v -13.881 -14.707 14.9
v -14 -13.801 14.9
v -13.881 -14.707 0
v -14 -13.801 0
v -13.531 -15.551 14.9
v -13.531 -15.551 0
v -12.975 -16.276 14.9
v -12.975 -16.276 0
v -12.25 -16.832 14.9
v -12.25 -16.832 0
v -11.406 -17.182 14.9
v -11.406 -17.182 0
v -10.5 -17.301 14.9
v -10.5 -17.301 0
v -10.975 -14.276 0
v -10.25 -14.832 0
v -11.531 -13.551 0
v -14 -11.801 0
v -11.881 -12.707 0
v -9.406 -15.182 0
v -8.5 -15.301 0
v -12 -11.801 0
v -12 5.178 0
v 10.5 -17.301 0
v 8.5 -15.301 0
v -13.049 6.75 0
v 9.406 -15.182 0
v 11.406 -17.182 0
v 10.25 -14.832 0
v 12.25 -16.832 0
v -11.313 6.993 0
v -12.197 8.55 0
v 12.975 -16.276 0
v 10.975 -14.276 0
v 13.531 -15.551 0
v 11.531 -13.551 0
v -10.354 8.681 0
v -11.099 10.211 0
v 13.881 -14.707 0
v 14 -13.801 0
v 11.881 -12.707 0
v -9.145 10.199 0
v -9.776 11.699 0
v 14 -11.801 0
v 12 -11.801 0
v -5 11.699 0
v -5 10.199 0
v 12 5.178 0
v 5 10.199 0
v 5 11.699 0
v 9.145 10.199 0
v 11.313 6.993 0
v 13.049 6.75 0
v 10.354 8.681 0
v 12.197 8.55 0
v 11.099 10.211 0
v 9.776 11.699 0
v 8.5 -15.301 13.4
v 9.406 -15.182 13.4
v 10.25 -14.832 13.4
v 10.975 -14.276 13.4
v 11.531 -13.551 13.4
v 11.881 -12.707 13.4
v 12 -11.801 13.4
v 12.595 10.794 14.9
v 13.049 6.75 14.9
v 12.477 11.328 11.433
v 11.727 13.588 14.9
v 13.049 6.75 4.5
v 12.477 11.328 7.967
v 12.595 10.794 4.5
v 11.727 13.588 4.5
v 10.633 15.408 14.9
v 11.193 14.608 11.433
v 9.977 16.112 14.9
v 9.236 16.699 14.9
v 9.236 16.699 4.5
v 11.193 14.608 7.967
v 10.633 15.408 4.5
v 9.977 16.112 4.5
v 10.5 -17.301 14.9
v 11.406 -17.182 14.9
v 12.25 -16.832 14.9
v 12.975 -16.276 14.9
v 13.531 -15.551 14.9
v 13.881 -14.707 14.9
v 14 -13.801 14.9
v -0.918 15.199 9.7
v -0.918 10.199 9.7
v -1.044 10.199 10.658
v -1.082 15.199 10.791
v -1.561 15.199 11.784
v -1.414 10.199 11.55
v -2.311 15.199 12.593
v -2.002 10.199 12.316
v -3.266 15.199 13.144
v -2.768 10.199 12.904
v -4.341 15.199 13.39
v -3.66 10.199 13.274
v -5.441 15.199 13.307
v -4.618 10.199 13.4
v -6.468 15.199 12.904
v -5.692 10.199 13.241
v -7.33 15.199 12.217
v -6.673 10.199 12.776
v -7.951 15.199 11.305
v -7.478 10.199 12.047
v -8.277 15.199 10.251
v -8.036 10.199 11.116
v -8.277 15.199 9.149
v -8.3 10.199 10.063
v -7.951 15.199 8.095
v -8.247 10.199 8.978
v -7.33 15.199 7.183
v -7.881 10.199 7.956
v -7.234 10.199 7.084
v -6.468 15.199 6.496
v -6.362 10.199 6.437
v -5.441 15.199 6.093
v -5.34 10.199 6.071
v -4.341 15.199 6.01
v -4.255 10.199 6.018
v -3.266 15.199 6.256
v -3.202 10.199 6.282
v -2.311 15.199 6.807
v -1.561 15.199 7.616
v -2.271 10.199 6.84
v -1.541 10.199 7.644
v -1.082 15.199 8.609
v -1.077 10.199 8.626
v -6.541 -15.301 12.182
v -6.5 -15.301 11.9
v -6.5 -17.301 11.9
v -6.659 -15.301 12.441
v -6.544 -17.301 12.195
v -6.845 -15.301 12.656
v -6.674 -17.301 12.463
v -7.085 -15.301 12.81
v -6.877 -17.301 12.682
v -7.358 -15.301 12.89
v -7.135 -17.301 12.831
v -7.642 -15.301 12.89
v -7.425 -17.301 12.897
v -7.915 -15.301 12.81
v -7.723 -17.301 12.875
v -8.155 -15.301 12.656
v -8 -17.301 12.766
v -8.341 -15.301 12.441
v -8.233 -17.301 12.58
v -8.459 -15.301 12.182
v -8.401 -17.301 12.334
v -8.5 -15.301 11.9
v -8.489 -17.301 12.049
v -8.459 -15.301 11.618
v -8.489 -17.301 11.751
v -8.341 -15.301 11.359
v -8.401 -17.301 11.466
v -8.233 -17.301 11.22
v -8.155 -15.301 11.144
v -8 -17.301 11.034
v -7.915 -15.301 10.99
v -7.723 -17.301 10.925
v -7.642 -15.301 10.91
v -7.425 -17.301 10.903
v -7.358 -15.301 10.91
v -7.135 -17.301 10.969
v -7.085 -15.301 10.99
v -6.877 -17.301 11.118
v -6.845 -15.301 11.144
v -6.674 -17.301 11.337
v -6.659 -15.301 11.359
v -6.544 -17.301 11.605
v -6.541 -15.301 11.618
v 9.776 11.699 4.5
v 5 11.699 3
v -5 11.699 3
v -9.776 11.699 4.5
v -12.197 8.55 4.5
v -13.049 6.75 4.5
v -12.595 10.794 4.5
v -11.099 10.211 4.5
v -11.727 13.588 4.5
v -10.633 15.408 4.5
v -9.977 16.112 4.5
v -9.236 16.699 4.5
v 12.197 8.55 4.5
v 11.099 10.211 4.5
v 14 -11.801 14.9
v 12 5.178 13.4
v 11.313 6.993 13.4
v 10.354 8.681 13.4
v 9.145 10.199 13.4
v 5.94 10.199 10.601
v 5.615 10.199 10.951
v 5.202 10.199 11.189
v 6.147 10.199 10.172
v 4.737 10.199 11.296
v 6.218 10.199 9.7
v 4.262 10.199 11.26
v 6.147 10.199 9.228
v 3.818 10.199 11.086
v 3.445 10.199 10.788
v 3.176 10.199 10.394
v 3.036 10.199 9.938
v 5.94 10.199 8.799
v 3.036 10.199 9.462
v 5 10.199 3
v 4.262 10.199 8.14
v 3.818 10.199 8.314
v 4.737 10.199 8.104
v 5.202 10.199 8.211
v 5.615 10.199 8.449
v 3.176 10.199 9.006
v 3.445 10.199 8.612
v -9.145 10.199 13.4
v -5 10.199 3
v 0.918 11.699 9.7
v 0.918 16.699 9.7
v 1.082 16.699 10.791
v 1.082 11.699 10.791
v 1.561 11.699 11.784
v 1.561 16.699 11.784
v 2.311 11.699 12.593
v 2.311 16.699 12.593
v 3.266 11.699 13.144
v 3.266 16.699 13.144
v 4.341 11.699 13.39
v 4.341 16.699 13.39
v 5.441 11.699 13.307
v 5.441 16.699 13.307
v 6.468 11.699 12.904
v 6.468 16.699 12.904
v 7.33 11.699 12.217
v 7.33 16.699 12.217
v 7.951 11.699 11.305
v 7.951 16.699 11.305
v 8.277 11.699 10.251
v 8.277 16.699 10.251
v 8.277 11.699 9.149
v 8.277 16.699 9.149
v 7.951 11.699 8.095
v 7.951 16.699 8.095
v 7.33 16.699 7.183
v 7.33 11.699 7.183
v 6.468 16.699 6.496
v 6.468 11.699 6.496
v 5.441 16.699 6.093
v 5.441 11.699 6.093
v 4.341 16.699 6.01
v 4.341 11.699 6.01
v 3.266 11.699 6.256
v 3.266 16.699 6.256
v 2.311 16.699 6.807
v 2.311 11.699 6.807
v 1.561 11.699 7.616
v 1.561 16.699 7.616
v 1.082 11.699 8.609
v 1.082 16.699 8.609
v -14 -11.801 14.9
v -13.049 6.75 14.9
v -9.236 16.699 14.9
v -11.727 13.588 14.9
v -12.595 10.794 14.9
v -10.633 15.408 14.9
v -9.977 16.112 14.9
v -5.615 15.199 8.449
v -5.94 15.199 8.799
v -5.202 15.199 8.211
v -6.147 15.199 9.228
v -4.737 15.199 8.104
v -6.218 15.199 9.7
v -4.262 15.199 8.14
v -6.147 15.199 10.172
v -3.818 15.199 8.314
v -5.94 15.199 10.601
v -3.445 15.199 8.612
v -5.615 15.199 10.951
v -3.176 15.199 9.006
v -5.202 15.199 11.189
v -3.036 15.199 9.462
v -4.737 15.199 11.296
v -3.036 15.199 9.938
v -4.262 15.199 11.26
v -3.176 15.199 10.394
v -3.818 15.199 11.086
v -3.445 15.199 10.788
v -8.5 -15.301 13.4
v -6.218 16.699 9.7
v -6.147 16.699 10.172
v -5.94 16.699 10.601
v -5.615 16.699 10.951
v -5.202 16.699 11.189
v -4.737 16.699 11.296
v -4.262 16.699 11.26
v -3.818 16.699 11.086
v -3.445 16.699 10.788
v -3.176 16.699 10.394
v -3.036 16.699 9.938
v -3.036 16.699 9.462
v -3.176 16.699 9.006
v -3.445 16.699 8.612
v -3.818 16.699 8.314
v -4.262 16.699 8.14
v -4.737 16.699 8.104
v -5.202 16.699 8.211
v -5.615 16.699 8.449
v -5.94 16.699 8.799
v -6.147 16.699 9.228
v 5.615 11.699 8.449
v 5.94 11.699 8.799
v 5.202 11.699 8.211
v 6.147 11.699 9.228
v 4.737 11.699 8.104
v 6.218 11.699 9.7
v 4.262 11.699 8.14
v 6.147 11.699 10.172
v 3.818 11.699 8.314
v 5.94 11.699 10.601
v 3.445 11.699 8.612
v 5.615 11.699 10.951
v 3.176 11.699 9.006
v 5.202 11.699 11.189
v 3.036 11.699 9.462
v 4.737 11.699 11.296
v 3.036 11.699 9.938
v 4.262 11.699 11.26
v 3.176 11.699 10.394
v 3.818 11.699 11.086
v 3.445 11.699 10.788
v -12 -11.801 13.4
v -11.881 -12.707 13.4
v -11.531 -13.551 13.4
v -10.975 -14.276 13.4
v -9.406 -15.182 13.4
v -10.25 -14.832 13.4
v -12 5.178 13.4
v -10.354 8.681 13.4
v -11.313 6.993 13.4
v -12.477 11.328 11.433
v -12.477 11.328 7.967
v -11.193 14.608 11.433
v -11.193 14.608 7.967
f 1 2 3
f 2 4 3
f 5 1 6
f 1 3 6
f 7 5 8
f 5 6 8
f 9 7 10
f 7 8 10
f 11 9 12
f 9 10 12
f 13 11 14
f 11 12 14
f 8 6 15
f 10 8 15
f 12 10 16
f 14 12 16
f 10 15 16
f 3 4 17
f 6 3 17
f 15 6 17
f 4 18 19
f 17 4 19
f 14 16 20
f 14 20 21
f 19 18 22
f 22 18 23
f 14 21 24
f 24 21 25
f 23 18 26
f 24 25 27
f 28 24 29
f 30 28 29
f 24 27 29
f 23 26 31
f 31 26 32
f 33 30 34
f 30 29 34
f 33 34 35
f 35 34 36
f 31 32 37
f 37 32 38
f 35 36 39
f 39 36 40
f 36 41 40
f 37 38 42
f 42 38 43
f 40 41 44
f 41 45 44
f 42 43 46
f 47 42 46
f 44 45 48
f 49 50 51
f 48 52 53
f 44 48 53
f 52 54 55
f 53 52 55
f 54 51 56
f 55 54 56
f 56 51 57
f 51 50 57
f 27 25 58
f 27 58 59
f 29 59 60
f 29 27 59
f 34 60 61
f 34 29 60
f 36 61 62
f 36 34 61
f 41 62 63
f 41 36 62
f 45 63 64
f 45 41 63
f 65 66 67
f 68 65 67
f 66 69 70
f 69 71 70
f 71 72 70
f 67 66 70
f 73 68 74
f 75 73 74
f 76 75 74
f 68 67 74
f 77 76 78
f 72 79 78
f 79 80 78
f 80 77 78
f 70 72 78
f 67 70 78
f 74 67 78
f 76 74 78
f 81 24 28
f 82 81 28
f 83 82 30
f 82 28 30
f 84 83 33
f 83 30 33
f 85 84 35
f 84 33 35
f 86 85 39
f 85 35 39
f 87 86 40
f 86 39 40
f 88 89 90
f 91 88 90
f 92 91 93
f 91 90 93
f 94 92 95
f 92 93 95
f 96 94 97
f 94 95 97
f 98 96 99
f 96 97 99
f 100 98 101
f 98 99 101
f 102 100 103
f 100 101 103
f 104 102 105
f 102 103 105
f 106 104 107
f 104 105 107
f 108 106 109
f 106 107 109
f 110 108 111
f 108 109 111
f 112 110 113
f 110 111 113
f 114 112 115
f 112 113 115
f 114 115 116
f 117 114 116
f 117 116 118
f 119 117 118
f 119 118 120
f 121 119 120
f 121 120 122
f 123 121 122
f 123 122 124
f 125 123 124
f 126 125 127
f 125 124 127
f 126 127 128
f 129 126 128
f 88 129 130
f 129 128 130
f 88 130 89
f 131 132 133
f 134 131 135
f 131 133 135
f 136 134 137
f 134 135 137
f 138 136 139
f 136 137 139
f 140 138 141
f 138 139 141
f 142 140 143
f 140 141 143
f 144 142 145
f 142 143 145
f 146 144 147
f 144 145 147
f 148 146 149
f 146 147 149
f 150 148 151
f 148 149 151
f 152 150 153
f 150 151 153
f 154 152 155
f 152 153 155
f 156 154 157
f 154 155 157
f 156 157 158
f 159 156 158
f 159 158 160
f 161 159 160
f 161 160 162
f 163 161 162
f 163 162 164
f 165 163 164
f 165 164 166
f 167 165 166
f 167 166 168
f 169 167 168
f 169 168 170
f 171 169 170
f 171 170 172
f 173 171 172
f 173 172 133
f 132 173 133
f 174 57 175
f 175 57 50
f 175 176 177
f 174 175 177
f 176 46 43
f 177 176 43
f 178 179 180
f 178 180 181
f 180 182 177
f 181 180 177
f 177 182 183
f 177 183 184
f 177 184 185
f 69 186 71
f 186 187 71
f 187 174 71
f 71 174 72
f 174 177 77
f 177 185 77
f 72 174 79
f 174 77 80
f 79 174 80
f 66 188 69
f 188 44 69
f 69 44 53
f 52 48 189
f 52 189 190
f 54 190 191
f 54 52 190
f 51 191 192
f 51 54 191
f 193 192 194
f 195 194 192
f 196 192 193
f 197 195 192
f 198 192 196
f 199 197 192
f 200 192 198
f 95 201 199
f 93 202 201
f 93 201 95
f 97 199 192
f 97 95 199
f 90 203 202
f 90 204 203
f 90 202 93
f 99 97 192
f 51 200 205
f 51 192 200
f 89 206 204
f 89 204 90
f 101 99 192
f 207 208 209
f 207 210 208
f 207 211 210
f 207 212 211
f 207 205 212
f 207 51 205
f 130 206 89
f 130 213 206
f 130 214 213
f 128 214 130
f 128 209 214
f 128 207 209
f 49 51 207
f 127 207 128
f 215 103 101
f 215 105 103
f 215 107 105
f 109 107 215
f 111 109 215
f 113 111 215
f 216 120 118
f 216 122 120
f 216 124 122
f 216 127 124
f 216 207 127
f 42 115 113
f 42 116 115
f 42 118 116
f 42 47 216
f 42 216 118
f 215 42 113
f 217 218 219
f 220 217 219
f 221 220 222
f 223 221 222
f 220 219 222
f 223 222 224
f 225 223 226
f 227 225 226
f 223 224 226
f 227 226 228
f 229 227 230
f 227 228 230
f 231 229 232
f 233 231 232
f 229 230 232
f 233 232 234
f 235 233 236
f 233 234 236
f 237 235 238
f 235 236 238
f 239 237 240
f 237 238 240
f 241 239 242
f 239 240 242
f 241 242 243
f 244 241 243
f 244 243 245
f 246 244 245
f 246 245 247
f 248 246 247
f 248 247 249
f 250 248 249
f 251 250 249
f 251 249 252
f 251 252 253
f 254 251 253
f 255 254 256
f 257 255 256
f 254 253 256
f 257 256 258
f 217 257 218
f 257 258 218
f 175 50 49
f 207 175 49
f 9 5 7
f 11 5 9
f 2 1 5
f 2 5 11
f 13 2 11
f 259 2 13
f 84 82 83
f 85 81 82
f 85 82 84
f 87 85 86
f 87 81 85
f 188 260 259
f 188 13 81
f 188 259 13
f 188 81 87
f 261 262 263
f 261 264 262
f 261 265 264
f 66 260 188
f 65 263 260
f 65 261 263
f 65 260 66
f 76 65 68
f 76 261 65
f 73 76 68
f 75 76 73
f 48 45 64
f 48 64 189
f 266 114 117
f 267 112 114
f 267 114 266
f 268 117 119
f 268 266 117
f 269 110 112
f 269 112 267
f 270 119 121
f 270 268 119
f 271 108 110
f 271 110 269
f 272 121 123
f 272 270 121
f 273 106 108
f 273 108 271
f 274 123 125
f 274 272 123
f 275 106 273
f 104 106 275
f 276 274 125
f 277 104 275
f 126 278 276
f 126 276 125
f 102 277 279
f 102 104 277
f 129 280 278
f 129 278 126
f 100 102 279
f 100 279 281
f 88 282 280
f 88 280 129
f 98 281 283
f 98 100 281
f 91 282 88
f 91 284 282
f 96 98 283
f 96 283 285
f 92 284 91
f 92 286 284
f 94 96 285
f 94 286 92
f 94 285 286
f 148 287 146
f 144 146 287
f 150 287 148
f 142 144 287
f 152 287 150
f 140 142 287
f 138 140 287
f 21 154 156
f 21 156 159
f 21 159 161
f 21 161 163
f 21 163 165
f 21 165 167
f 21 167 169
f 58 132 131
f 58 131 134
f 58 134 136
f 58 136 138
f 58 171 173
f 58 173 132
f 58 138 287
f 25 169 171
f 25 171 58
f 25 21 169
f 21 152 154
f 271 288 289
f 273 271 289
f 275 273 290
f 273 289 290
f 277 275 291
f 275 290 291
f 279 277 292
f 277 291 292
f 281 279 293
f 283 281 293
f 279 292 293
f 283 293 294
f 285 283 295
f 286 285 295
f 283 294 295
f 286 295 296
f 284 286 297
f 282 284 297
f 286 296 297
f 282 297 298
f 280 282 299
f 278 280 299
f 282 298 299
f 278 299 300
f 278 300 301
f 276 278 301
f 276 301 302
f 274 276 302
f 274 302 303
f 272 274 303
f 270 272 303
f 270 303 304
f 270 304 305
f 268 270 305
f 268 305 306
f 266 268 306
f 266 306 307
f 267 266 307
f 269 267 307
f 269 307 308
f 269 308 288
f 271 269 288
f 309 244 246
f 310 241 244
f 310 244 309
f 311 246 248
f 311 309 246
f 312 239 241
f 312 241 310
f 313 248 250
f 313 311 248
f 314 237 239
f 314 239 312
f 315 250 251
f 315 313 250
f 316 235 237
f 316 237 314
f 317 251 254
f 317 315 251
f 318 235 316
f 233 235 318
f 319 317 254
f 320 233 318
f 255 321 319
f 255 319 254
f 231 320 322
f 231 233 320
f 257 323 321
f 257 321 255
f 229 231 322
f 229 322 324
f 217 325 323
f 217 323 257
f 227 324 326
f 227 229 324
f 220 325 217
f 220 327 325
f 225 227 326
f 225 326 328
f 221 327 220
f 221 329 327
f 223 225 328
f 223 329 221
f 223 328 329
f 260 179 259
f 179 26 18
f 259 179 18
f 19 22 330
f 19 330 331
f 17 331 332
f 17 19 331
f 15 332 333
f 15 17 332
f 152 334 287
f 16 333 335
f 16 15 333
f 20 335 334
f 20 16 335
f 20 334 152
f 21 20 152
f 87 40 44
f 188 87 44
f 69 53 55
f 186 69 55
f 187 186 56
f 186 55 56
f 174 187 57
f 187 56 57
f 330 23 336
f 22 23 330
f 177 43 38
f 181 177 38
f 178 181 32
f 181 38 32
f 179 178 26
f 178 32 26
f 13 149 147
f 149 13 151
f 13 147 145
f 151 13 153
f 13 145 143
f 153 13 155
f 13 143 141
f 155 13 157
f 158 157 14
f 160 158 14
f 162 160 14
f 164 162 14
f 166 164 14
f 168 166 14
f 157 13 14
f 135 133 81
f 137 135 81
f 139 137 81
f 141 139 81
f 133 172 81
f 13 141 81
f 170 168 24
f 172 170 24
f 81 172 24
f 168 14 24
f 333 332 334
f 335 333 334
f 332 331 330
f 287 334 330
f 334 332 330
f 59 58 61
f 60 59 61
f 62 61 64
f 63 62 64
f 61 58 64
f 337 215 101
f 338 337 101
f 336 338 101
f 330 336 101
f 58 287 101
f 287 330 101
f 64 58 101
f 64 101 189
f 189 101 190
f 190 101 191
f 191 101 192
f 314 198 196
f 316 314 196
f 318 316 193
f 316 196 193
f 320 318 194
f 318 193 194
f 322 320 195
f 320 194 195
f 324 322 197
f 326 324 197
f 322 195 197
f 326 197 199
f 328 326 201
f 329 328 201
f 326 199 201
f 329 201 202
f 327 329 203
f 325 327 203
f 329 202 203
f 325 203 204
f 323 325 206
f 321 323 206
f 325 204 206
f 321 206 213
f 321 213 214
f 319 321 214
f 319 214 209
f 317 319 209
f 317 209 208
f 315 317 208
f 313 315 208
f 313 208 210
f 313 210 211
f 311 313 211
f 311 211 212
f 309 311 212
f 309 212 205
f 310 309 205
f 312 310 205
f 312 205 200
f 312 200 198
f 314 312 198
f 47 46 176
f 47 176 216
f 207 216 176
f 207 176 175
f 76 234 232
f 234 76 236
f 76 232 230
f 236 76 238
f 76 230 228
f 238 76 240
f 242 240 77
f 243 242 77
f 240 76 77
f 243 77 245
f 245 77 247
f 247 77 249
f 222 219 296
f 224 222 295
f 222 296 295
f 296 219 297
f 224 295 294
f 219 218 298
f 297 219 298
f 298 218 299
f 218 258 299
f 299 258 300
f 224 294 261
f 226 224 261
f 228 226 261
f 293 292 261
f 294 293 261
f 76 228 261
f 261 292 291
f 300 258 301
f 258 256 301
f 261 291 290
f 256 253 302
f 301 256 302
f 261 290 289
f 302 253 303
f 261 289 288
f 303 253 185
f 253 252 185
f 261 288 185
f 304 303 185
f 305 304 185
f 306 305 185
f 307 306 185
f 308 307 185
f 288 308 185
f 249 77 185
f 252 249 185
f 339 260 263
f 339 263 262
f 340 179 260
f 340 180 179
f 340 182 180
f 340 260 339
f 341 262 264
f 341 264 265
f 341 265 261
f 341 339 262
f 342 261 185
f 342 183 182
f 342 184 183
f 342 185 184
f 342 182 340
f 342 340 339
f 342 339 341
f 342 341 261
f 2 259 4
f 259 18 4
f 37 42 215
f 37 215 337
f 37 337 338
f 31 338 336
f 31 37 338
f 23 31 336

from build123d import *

# Parameters (mm, degrees)
F1_DEPTH  = 4.5
F3_DEPTH  = 10.4
F5_DEPTH  = 13.4
F6_R      = 3.7
F6_R_2    = 1.6
F7_DEPTH  = 5
F8_R      = 1.6
F8_R_2    = 3.7
F9_DEPTH  = 5
F10_R     = 1
F11_DEPTH = 2
F12_W     = 10
F12_H     = 1.5
F13_DEPTH = 3


with BuildPart() as f1:
    # F0 (on Top) → F1 (new body)
    with BuildSketch(Plane.XY):
        with BuildLine():
            ThreePointArc((-14, -13.8007847667), (-12.9748737342, -16.2756585008), (-10.5, -17.3007847667))
            Line((-10.5, -17.3007847667), (-6.75, -17.3007847667))
            Line((-6.75, -17.3007847667), (6.75, -17.3007847667))
            Line((6.75, -17.3007847667), (10.5, -17.3007847667))
            ThreePointArc((10.5, -17.3007847667), (12.9748737342, -16.2756585008), (14, -13.8007847667))
            Line((14, -13.8007847667), (14, -11.8007847667))
            Line((14, -11.8007847667), (13.0486556537, 6.7504299853))
            ThreePointArc((13.0486556537, 6.7504299853), (11.6774697173, 9.4001806183), (9.7759521317, 11.6992152333))
            Line((9.7759521317, 11.6992152333), (-9.7759521317, 11.6992152333))
            ThreePointArc((-9.7759521317, 11.6992152333), (-11.6774697173, 9.4001806183), (-13.0486556537, 6.7504299853))
            Line((-13.0486556537, 6.7504299853), (-14, -11.8007847667))
            Line((-14, -11.8007847667), (-14, -13.8007847667))
        make_face()
    extrude(amount=F1_DEPTH)

    # F2 (on face) → F3 (join)
    with BuildSketch(Plane.XY.offset(4.5)):
        with BuildLine():
            Line((14, -13.8007847667), (14, -11.8007847667))
            Line((14, -11.8007847667), (13.0486556537, 6.7504299853))
            add(Edge.make_bspline(
                [(13.0486556537, 6.7504299853), (12.8450421616, 12.0132155716), (11.5178218111, 15.1653625071), (9.2356767608, 16.6992152333)],
                knots=[0, 0, 0, 0, 10.6544420759, 10.6544420759, 10.6544420759, 10.6544420759], degree=3))
            Line((9.2356767608, 16.6992152333), (-9.2356767608, 16.6992152333))
            add(Edge.make_bspline(
                [(-13.0486556537, 6.7504299853), (-12.8450421616, 12.0132155716), (-11.5178218111, 15.1653625071), (-9.2356767608, 16.6992152333)],
                knots=[0, 0, 0, 0, 10.6544420759, 10.6544420759, 10.6544420759, 10.6544420759], degree=3))
            Line((-13.0486556537, 6.7504299853), (-14, -11.8007847667))
            Line((-14, -11.8007847667), (-14, -13.8007847667))
            ThreePointArc((-14, -13.8007847667), (-12.9748737342, -16.2756585008), (-10.5, -17.3007847667))
            Line((-10.5, -17.3007847667), (10.5, -17.3007847667))
            ThreePointArc((10.5, -17.3007847667), (12.9748737342, -16.2756585008), (14, -13.8007847667))
        make_face()
    extrude(amount=F3_DEPTH)

    # F4 (on face) → F5 (cut)
    with BuildSketch(Plane.XY):
        with BuildLine():
            Line((0, -15.3007847667), (8.5, -15.3007847667))
            ThreePointArc((8.5, -15.3007847667), (10.9748737342, -14.2756585008), (12, -11.8007847667))
            Line((12, -11.8007847667), (12, 5.1777003818))
            ThreePointArc((12, 5.1777003818), (10.8666119051, 7.8556244429), (9.145150881, 10.1992152333))
            Line((9.145150881, 10.1992152333), (-9.145150881, 10.1992152333))
            ThreePointArc((-9.145150881, 10.1992152333), (-10.8666119051, 7.8556244429), (-12, 5.1777003818))
            Line((-12, 5.1777003818), (-12, -11.8007847667))
            ThreePointArc((-12, -11.8007847667), (-10.9748737342, -14.2756585008), (-8.5, -15.3007847667))
            Line((-8.5, -15.3007847667), (0, -15.3007847667))
        make_face()
    extrude(amount=F5_DEPTH, mode=Mode.SUBTRACT)

    # F6 (on face) → F7 (cut)
    with BuildSketch(Plane(origin=(0, 16.6992152333, 0), x_dir=(-1, 0, 0), z_dir=(0, 1, 0))):
        with Locations((-4.6178383804, 9.7)):
            Circle(F6_R)
        with Locations((4.6178383804, 9.7)):
            Circle(F6_R_2)
    extrude(amount=-F7_DEPTH, mode=Mode.SUBTRACT)

    # F8 (on face) → F9 (cut)
    with BuildSketch(Plane.XZ.offset(-10.1992152333)):
        with Locations((4.6178383804, 9.7)):
            Circle(F8_R)
        with Locations((-4.6178383804, 9.7)):
            Circle(F8_R_2)
    extrude(amount=-F9_DEPTH, mode=Mode.SUBTRACT)

    # F10 (on face) → F11 (cut, through all)
    with BuildSketch(Plane.XZ.offset(17.3007847667)):
        with Locations((-7.5, 11.9)):
            Circle(F10_R)
    extrude(amount=-F11_DEPTH, mode=Mode.SUBTRACT)

    # F12 (on face) → F13 (cut)
    with BuildSketch(Plane(origin=(0, 0, 0), x_dir=(1, 0, 0), z_dir=(0, 0, -1))):
        with Locations((0, -10.9492152333)):
            Rectangle(F12_W, F12_H)
    extrude(amount=-F13_DEPTH, mode=Mode.SUBTRACT)


solid = f1.part
